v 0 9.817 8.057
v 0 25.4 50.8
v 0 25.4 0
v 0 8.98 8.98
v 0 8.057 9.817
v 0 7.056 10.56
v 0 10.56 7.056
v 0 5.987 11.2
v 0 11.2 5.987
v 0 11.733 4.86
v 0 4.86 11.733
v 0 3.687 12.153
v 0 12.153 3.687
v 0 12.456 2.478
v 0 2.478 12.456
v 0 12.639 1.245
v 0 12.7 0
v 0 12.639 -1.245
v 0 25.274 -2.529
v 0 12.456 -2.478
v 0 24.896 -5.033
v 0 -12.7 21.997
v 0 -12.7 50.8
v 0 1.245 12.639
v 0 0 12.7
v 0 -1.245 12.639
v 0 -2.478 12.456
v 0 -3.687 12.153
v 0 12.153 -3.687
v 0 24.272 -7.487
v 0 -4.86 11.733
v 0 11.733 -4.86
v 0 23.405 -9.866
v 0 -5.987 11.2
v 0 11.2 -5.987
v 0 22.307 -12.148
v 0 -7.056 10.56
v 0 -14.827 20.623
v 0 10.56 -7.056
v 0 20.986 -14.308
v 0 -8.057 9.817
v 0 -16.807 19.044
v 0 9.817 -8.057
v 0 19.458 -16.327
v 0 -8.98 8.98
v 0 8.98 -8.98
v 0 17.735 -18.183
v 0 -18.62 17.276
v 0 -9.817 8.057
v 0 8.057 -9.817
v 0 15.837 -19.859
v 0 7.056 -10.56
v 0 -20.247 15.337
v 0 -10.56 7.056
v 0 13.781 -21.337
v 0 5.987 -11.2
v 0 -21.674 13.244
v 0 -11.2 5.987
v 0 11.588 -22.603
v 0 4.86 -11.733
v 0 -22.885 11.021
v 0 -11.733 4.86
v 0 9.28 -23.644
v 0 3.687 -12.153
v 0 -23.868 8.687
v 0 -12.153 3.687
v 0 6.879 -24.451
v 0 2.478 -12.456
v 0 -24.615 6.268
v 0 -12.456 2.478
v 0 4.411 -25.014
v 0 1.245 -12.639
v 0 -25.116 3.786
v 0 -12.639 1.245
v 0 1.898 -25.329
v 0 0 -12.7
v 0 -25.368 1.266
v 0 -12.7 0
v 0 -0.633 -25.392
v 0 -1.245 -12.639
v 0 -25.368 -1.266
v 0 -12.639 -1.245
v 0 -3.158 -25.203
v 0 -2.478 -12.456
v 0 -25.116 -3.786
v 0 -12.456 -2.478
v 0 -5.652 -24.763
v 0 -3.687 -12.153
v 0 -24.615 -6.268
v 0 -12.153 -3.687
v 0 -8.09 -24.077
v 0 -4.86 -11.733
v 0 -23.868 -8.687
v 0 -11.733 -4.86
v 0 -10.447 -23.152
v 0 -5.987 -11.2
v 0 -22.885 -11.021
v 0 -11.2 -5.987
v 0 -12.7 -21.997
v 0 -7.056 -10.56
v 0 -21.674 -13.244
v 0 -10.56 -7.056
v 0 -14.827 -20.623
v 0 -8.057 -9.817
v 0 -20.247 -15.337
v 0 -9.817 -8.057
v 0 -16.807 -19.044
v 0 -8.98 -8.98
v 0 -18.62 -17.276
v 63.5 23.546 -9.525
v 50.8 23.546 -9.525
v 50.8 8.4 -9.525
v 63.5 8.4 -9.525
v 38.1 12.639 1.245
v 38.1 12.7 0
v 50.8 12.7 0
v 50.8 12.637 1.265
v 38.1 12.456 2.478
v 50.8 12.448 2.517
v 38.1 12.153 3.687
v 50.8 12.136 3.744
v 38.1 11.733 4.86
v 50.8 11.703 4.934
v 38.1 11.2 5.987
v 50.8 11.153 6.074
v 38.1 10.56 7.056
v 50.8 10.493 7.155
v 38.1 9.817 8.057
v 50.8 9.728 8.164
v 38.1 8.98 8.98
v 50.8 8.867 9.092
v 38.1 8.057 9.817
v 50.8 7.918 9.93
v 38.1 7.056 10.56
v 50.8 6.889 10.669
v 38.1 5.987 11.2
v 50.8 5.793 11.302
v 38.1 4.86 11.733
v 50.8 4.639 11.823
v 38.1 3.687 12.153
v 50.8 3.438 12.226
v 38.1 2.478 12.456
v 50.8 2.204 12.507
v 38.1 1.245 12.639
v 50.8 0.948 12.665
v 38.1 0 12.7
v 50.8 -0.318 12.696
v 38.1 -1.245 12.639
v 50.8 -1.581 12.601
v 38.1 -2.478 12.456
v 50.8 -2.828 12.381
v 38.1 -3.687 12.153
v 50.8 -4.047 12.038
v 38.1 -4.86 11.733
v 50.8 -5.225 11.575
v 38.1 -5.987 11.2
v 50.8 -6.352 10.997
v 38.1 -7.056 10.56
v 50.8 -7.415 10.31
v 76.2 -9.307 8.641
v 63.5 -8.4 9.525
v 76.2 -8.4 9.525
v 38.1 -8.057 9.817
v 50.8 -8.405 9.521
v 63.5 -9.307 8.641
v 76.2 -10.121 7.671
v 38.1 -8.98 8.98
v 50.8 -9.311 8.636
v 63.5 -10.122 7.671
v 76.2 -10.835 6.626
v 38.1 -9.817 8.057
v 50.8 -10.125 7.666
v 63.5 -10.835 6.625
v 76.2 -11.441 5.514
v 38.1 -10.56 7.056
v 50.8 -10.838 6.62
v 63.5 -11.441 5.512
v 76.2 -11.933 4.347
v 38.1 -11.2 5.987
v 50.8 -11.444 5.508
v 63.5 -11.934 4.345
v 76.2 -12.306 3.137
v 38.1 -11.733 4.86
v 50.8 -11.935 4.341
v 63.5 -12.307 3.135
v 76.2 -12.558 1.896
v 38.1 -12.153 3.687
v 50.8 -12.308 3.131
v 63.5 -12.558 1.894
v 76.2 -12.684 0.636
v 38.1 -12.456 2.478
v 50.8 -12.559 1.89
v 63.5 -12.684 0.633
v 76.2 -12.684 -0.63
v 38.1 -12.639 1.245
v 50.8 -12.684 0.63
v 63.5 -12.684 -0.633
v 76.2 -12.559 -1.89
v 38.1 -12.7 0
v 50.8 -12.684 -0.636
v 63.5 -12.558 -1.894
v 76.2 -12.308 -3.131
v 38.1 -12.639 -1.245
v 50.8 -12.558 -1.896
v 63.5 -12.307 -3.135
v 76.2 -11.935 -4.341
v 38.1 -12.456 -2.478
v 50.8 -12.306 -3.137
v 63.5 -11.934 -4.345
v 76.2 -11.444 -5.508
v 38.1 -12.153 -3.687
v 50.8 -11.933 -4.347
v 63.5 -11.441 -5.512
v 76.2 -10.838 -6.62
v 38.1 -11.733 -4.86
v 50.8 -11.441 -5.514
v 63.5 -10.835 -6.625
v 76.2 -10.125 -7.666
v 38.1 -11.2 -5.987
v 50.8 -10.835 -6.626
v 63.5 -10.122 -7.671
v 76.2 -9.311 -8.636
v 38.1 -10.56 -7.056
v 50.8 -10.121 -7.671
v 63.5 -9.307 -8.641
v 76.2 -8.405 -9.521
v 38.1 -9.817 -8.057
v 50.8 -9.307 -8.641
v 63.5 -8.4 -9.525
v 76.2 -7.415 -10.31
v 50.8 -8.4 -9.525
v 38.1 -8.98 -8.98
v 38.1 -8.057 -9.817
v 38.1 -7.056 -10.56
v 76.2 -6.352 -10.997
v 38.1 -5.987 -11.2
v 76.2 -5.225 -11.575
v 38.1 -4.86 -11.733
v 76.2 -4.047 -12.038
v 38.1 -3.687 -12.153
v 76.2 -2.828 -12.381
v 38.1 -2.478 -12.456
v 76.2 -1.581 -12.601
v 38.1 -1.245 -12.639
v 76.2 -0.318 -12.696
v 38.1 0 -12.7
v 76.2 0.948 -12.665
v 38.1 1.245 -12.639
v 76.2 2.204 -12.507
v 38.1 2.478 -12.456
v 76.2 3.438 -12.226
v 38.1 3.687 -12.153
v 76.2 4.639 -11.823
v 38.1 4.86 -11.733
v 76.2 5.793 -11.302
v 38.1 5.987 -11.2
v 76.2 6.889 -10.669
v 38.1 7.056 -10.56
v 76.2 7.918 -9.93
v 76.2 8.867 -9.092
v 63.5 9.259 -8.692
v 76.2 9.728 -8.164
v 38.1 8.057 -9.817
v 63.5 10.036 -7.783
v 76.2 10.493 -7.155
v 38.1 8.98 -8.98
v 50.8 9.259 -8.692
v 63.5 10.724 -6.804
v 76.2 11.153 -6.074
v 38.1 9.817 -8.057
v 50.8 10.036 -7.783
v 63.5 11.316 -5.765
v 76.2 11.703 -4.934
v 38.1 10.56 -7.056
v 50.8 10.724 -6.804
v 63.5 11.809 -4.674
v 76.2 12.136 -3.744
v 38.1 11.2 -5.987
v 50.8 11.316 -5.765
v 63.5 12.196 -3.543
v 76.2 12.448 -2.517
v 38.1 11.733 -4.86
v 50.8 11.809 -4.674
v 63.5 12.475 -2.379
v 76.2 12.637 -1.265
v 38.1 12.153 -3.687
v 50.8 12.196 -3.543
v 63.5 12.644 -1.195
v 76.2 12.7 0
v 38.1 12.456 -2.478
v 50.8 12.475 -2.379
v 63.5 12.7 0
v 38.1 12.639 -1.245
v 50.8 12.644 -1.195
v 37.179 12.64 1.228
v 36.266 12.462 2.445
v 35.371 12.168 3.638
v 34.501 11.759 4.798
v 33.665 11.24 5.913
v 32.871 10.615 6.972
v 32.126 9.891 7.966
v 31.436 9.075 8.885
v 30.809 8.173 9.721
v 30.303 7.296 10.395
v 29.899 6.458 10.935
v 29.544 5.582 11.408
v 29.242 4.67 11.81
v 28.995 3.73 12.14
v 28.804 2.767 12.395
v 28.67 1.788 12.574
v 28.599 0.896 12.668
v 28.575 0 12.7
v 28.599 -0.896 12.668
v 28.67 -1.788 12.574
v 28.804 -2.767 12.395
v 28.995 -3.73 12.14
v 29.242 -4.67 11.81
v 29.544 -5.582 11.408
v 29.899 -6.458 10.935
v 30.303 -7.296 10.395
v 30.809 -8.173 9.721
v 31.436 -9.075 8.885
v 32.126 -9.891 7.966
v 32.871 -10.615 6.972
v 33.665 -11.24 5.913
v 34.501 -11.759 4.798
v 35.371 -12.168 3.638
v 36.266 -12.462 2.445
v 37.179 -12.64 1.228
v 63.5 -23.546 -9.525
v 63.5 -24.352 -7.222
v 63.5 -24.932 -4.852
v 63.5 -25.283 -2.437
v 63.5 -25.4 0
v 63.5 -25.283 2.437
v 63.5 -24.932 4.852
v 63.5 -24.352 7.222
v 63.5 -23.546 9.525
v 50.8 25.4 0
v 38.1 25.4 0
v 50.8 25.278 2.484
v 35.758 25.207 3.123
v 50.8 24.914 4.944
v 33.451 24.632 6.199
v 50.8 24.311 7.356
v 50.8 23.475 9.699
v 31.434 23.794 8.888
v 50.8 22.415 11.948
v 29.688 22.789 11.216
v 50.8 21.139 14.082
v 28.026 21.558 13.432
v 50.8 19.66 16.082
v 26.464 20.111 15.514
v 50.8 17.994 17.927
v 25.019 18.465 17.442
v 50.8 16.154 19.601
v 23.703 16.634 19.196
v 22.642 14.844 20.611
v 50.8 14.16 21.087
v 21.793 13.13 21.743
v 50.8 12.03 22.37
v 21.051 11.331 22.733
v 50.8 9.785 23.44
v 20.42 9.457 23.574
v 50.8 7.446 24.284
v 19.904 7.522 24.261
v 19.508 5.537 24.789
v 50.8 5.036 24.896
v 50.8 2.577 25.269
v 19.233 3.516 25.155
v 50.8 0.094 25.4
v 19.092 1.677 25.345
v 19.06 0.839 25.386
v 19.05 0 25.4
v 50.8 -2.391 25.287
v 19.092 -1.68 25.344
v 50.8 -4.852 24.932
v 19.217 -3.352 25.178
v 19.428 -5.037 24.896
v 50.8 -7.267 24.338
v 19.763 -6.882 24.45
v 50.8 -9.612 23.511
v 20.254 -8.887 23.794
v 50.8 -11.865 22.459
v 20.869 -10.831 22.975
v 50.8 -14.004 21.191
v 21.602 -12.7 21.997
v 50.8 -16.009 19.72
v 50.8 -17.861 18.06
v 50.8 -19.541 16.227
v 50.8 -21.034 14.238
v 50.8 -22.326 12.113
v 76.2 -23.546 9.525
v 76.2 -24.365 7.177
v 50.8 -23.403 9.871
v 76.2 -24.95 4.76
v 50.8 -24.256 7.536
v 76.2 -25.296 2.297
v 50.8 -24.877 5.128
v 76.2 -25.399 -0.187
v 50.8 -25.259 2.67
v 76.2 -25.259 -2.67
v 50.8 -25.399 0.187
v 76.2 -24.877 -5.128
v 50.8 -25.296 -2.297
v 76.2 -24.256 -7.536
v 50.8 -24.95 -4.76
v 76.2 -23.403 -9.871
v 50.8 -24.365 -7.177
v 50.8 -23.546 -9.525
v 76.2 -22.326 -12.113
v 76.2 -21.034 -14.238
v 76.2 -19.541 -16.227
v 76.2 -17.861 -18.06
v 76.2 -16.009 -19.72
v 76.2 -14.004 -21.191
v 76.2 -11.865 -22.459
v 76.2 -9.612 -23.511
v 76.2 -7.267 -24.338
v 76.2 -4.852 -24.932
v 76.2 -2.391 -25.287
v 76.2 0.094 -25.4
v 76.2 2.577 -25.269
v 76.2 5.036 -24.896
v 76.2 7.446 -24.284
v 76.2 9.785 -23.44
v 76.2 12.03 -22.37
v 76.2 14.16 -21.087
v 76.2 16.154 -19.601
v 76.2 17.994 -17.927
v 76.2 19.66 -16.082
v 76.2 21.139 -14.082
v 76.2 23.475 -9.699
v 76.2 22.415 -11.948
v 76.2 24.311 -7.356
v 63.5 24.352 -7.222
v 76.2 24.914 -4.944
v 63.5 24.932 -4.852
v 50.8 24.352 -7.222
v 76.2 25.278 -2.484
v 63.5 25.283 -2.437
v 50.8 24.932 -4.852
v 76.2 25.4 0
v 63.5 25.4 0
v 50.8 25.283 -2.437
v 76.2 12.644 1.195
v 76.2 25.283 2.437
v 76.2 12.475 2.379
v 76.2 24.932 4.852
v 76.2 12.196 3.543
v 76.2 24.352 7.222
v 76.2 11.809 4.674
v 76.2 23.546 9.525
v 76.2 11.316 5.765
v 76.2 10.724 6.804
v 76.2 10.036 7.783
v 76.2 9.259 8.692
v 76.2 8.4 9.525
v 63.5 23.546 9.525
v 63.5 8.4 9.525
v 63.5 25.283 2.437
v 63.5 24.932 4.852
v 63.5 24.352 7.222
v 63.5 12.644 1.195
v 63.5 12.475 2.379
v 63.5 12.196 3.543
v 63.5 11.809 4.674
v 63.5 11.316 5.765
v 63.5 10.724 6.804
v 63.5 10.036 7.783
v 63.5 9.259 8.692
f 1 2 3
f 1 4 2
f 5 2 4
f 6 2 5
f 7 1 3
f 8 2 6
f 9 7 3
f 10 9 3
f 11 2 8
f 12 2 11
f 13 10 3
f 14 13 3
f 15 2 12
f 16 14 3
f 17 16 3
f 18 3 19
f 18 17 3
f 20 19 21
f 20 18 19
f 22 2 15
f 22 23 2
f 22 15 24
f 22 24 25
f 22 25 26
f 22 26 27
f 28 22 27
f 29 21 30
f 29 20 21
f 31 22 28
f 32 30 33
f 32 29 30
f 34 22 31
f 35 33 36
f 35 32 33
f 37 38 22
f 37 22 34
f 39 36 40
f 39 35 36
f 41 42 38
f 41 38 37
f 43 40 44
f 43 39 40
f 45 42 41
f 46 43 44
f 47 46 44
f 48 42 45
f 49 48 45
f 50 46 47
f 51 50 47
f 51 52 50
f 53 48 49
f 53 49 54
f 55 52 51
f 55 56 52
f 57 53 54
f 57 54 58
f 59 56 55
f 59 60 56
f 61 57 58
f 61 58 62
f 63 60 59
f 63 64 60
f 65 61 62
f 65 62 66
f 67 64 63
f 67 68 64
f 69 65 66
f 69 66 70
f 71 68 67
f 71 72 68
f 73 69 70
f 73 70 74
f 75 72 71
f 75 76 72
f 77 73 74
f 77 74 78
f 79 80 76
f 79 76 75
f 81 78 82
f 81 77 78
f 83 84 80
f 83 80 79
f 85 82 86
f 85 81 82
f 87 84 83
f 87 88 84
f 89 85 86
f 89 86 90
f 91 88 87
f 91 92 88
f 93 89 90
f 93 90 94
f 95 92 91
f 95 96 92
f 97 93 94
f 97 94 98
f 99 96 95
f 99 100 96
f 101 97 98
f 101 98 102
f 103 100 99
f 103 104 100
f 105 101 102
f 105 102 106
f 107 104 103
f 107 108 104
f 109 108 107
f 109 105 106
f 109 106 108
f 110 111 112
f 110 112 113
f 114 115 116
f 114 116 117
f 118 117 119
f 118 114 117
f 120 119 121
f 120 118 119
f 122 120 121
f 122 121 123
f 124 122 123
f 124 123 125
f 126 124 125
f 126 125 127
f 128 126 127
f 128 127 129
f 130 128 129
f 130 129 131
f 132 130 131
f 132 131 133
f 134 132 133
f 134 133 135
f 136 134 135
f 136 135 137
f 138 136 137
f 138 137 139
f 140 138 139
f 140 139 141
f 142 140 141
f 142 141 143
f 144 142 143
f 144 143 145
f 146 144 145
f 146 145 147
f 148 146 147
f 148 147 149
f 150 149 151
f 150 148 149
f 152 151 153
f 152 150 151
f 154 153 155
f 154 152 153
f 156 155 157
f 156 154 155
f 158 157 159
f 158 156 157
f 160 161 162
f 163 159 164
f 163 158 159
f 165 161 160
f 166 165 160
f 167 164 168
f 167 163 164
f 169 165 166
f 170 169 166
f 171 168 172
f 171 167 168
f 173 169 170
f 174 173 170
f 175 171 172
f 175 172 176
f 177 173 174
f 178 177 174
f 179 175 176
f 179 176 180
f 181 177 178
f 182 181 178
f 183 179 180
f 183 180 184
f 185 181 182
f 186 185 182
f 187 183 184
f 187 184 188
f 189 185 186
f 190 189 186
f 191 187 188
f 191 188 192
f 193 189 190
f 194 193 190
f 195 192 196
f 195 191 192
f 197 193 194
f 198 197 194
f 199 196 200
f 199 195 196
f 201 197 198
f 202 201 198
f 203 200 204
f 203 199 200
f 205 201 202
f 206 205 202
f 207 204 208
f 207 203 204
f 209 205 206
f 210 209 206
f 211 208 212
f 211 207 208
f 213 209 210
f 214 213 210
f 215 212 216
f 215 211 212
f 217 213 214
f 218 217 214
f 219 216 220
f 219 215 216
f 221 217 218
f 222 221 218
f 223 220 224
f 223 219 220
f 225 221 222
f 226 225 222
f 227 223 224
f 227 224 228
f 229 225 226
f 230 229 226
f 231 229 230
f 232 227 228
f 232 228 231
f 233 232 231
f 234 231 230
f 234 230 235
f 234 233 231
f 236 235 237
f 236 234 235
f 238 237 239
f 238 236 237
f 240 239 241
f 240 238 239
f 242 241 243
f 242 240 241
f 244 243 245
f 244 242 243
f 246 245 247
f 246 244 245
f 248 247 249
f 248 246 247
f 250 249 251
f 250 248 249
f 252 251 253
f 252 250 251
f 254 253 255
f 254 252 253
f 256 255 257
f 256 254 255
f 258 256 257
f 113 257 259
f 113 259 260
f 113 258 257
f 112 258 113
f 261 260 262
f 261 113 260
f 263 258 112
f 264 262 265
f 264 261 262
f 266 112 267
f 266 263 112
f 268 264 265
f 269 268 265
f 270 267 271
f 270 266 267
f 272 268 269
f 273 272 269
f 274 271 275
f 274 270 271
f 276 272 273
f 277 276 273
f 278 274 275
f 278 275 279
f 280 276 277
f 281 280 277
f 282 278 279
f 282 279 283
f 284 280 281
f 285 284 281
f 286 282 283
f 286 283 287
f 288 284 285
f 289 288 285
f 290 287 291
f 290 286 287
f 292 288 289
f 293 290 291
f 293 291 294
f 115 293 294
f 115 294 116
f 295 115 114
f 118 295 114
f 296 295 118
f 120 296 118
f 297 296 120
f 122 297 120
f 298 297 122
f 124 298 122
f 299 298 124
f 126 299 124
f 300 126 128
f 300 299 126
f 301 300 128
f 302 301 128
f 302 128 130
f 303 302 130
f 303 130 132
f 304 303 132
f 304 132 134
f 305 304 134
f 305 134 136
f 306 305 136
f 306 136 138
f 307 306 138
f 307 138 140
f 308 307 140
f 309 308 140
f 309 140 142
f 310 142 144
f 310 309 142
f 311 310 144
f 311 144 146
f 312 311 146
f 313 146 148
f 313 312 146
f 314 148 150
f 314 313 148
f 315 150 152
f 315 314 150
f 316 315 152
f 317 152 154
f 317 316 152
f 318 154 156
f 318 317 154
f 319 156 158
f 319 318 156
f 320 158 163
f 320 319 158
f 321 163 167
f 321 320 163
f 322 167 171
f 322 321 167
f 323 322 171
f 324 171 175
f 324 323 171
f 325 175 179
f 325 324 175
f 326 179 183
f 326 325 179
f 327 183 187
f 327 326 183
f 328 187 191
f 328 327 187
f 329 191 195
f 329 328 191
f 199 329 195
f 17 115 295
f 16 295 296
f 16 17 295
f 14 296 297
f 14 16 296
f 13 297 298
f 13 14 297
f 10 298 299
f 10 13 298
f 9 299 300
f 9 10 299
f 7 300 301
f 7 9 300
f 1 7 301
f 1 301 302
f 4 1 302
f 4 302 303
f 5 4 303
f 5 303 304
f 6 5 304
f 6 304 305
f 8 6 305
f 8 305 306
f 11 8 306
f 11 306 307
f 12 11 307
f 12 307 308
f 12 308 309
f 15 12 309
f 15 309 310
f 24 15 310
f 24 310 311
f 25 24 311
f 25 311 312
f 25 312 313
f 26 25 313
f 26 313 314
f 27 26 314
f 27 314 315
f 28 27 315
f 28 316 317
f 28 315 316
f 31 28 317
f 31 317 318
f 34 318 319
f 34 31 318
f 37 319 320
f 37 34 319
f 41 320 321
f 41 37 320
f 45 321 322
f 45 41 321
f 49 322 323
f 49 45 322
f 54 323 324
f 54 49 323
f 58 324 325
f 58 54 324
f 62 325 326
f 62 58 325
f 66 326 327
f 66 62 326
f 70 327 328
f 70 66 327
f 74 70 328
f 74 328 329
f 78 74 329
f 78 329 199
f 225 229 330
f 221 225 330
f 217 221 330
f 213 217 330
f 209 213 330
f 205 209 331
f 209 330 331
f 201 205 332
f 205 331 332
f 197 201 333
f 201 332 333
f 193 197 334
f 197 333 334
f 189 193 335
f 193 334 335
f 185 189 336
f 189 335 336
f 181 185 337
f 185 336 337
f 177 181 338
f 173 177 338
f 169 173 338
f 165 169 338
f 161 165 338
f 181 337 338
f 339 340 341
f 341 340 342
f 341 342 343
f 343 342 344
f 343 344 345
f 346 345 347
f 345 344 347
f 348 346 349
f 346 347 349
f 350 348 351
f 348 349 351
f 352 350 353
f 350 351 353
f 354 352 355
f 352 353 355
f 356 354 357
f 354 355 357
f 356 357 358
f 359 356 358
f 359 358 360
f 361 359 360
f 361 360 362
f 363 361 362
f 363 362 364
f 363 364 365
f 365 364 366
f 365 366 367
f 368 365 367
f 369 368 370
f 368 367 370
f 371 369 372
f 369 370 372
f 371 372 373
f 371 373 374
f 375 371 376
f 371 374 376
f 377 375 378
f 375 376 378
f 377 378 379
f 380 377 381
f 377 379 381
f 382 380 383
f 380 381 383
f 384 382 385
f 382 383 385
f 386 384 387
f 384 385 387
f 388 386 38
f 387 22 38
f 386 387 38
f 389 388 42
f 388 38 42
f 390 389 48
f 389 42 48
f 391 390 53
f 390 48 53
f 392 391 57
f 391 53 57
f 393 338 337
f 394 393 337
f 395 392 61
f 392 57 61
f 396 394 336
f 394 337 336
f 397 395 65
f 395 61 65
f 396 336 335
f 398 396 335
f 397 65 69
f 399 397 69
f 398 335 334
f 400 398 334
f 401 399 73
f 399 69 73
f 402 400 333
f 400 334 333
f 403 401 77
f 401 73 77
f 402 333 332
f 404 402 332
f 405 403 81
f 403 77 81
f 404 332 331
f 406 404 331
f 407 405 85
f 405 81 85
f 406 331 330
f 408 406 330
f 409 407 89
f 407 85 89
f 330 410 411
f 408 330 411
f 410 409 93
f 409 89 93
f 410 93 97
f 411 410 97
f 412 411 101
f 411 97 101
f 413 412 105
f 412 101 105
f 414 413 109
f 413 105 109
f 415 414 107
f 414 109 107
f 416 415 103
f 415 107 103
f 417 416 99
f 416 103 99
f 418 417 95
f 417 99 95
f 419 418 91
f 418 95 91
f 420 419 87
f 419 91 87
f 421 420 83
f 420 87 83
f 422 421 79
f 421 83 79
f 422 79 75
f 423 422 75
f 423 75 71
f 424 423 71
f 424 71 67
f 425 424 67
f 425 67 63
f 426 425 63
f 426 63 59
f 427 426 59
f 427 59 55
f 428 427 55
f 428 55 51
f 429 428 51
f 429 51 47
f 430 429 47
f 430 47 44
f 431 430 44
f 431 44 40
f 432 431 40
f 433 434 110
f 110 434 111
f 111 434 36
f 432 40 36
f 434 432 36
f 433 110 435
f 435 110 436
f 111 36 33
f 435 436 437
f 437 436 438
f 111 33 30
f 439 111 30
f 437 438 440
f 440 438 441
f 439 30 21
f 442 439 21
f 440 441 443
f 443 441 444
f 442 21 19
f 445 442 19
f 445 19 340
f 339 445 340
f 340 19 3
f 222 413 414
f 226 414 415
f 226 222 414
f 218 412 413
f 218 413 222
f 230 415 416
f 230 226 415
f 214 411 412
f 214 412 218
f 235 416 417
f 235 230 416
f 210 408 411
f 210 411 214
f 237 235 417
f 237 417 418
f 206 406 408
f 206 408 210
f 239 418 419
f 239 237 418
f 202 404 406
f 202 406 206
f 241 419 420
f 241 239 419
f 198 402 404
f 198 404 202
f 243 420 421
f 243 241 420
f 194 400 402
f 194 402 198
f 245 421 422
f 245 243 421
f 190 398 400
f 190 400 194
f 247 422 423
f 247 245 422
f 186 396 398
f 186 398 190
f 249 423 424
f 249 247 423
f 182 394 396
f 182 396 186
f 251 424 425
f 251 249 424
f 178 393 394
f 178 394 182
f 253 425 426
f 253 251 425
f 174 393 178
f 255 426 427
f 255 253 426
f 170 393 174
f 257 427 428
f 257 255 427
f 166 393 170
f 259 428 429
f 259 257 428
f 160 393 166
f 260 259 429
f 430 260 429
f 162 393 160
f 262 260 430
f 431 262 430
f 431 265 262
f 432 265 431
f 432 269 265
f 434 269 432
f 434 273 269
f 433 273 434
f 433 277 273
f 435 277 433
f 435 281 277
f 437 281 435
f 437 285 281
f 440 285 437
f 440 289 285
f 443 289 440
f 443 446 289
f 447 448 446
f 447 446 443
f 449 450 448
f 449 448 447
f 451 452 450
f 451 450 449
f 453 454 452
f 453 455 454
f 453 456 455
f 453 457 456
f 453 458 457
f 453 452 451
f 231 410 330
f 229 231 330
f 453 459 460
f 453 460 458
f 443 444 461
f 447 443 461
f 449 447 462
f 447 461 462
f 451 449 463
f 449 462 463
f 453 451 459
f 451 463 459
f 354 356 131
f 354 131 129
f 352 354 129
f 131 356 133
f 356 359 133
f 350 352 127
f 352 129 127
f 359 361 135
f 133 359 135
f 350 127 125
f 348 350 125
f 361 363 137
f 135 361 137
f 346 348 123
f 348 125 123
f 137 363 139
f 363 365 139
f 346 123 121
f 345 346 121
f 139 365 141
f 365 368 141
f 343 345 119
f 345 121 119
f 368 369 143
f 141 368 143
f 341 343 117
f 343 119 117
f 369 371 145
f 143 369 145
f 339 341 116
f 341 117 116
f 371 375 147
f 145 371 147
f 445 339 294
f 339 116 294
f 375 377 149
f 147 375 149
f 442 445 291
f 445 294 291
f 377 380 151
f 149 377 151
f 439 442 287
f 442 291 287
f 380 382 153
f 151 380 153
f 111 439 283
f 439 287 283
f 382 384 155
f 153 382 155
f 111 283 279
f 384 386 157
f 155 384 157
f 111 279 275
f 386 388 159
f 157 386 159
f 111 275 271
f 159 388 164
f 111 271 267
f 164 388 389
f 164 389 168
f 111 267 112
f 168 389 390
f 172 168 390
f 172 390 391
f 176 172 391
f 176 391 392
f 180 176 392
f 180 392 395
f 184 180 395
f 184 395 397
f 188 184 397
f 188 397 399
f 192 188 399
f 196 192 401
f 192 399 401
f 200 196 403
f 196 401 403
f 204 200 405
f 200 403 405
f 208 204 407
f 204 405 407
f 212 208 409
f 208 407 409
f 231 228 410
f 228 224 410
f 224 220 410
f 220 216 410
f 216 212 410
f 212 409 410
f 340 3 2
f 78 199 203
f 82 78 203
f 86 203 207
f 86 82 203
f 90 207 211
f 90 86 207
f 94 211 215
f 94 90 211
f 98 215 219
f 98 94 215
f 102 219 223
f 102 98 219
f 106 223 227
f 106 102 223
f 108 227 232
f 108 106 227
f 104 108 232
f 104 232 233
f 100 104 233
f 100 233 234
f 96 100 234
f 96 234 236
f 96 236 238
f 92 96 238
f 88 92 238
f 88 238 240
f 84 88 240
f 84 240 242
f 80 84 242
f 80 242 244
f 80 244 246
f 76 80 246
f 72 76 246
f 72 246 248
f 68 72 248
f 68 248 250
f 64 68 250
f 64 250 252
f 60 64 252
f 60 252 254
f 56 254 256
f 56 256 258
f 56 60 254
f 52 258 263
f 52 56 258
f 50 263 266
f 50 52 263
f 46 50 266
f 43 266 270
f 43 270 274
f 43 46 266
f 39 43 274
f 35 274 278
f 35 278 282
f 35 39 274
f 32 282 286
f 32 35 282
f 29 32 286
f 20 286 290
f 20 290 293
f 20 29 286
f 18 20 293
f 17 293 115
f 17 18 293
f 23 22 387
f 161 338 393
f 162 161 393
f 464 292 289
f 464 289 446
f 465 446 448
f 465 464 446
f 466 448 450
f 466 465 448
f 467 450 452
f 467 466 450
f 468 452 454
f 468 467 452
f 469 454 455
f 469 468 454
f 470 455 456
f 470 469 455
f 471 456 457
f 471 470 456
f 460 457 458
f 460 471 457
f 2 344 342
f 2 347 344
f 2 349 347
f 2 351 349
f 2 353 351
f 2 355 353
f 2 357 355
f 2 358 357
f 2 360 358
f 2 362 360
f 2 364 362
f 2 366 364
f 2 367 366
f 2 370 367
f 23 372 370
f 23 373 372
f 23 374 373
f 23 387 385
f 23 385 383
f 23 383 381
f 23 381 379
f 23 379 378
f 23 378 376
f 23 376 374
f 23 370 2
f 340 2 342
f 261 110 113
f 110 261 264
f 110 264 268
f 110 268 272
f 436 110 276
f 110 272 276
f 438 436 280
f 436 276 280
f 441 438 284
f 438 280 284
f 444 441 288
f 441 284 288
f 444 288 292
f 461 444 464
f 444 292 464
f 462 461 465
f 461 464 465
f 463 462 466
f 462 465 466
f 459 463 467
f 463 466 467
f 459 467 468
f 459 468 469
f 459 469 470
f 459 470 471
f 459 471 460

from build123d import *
from build123d import SkipClean  # not in build123d's __all__

# Parameters (mm, degrees)
F0_R          = 25.4
F0_R_2        = 12.7
F1_DEPTH      = 76.2
F3_DEPTH      = 25.4
F5_DEPTH      = 12.7
F5_DEPTH_BACK = 25.4
F6_R          = 12.7
F7_DEPTH      = 38.1


with BuildPart() as f1:
    # F0 (on Right) → F1 (new body)
    with BuildSketch(Plane.YZ):
        Circle(F0_R)
        Circle(F0_R_2, mode=Mode.SUBTRACT)
    extrude(amount=F1_DEPTH)

    # F2 (on Front) → F3 (cut, symmetric)
    with BuildSketch(Plane.XZ):
        Polygon((76.2, 9.525), (76.2, 25.4), (50.8, 25.4), (50.8, -9.525), (63.5, -9.525), (63.5, 9.525), align=None)
    extrude(amount=F3_DEPTH, both=True, mode=Mode.SUBTRACT)

    # F4 (on Front) → F5 (join, two sides)
    with BuildSketch(Plane.XZ) as f5_sk:
        Polygon((0, 50.8), (0, 0), (38.1, 0), align=None)
    extrude(amount=F5_DEPTH)
    extrude(f5_sk.sketch, amount=-F5_DEPTH_BACK)

    # F6 (on Right) → F7 (cut)
    with BuildSketch(Plane.YZ):
        Circle(F6_R)
    with SkipClean():  # cleaning this boolean's faces spoils the solid; the shape is the same uncleaned
        extrude(amount=F7_DEPTH, mode=Mode.SUBTRACT)


solid = f1.part
